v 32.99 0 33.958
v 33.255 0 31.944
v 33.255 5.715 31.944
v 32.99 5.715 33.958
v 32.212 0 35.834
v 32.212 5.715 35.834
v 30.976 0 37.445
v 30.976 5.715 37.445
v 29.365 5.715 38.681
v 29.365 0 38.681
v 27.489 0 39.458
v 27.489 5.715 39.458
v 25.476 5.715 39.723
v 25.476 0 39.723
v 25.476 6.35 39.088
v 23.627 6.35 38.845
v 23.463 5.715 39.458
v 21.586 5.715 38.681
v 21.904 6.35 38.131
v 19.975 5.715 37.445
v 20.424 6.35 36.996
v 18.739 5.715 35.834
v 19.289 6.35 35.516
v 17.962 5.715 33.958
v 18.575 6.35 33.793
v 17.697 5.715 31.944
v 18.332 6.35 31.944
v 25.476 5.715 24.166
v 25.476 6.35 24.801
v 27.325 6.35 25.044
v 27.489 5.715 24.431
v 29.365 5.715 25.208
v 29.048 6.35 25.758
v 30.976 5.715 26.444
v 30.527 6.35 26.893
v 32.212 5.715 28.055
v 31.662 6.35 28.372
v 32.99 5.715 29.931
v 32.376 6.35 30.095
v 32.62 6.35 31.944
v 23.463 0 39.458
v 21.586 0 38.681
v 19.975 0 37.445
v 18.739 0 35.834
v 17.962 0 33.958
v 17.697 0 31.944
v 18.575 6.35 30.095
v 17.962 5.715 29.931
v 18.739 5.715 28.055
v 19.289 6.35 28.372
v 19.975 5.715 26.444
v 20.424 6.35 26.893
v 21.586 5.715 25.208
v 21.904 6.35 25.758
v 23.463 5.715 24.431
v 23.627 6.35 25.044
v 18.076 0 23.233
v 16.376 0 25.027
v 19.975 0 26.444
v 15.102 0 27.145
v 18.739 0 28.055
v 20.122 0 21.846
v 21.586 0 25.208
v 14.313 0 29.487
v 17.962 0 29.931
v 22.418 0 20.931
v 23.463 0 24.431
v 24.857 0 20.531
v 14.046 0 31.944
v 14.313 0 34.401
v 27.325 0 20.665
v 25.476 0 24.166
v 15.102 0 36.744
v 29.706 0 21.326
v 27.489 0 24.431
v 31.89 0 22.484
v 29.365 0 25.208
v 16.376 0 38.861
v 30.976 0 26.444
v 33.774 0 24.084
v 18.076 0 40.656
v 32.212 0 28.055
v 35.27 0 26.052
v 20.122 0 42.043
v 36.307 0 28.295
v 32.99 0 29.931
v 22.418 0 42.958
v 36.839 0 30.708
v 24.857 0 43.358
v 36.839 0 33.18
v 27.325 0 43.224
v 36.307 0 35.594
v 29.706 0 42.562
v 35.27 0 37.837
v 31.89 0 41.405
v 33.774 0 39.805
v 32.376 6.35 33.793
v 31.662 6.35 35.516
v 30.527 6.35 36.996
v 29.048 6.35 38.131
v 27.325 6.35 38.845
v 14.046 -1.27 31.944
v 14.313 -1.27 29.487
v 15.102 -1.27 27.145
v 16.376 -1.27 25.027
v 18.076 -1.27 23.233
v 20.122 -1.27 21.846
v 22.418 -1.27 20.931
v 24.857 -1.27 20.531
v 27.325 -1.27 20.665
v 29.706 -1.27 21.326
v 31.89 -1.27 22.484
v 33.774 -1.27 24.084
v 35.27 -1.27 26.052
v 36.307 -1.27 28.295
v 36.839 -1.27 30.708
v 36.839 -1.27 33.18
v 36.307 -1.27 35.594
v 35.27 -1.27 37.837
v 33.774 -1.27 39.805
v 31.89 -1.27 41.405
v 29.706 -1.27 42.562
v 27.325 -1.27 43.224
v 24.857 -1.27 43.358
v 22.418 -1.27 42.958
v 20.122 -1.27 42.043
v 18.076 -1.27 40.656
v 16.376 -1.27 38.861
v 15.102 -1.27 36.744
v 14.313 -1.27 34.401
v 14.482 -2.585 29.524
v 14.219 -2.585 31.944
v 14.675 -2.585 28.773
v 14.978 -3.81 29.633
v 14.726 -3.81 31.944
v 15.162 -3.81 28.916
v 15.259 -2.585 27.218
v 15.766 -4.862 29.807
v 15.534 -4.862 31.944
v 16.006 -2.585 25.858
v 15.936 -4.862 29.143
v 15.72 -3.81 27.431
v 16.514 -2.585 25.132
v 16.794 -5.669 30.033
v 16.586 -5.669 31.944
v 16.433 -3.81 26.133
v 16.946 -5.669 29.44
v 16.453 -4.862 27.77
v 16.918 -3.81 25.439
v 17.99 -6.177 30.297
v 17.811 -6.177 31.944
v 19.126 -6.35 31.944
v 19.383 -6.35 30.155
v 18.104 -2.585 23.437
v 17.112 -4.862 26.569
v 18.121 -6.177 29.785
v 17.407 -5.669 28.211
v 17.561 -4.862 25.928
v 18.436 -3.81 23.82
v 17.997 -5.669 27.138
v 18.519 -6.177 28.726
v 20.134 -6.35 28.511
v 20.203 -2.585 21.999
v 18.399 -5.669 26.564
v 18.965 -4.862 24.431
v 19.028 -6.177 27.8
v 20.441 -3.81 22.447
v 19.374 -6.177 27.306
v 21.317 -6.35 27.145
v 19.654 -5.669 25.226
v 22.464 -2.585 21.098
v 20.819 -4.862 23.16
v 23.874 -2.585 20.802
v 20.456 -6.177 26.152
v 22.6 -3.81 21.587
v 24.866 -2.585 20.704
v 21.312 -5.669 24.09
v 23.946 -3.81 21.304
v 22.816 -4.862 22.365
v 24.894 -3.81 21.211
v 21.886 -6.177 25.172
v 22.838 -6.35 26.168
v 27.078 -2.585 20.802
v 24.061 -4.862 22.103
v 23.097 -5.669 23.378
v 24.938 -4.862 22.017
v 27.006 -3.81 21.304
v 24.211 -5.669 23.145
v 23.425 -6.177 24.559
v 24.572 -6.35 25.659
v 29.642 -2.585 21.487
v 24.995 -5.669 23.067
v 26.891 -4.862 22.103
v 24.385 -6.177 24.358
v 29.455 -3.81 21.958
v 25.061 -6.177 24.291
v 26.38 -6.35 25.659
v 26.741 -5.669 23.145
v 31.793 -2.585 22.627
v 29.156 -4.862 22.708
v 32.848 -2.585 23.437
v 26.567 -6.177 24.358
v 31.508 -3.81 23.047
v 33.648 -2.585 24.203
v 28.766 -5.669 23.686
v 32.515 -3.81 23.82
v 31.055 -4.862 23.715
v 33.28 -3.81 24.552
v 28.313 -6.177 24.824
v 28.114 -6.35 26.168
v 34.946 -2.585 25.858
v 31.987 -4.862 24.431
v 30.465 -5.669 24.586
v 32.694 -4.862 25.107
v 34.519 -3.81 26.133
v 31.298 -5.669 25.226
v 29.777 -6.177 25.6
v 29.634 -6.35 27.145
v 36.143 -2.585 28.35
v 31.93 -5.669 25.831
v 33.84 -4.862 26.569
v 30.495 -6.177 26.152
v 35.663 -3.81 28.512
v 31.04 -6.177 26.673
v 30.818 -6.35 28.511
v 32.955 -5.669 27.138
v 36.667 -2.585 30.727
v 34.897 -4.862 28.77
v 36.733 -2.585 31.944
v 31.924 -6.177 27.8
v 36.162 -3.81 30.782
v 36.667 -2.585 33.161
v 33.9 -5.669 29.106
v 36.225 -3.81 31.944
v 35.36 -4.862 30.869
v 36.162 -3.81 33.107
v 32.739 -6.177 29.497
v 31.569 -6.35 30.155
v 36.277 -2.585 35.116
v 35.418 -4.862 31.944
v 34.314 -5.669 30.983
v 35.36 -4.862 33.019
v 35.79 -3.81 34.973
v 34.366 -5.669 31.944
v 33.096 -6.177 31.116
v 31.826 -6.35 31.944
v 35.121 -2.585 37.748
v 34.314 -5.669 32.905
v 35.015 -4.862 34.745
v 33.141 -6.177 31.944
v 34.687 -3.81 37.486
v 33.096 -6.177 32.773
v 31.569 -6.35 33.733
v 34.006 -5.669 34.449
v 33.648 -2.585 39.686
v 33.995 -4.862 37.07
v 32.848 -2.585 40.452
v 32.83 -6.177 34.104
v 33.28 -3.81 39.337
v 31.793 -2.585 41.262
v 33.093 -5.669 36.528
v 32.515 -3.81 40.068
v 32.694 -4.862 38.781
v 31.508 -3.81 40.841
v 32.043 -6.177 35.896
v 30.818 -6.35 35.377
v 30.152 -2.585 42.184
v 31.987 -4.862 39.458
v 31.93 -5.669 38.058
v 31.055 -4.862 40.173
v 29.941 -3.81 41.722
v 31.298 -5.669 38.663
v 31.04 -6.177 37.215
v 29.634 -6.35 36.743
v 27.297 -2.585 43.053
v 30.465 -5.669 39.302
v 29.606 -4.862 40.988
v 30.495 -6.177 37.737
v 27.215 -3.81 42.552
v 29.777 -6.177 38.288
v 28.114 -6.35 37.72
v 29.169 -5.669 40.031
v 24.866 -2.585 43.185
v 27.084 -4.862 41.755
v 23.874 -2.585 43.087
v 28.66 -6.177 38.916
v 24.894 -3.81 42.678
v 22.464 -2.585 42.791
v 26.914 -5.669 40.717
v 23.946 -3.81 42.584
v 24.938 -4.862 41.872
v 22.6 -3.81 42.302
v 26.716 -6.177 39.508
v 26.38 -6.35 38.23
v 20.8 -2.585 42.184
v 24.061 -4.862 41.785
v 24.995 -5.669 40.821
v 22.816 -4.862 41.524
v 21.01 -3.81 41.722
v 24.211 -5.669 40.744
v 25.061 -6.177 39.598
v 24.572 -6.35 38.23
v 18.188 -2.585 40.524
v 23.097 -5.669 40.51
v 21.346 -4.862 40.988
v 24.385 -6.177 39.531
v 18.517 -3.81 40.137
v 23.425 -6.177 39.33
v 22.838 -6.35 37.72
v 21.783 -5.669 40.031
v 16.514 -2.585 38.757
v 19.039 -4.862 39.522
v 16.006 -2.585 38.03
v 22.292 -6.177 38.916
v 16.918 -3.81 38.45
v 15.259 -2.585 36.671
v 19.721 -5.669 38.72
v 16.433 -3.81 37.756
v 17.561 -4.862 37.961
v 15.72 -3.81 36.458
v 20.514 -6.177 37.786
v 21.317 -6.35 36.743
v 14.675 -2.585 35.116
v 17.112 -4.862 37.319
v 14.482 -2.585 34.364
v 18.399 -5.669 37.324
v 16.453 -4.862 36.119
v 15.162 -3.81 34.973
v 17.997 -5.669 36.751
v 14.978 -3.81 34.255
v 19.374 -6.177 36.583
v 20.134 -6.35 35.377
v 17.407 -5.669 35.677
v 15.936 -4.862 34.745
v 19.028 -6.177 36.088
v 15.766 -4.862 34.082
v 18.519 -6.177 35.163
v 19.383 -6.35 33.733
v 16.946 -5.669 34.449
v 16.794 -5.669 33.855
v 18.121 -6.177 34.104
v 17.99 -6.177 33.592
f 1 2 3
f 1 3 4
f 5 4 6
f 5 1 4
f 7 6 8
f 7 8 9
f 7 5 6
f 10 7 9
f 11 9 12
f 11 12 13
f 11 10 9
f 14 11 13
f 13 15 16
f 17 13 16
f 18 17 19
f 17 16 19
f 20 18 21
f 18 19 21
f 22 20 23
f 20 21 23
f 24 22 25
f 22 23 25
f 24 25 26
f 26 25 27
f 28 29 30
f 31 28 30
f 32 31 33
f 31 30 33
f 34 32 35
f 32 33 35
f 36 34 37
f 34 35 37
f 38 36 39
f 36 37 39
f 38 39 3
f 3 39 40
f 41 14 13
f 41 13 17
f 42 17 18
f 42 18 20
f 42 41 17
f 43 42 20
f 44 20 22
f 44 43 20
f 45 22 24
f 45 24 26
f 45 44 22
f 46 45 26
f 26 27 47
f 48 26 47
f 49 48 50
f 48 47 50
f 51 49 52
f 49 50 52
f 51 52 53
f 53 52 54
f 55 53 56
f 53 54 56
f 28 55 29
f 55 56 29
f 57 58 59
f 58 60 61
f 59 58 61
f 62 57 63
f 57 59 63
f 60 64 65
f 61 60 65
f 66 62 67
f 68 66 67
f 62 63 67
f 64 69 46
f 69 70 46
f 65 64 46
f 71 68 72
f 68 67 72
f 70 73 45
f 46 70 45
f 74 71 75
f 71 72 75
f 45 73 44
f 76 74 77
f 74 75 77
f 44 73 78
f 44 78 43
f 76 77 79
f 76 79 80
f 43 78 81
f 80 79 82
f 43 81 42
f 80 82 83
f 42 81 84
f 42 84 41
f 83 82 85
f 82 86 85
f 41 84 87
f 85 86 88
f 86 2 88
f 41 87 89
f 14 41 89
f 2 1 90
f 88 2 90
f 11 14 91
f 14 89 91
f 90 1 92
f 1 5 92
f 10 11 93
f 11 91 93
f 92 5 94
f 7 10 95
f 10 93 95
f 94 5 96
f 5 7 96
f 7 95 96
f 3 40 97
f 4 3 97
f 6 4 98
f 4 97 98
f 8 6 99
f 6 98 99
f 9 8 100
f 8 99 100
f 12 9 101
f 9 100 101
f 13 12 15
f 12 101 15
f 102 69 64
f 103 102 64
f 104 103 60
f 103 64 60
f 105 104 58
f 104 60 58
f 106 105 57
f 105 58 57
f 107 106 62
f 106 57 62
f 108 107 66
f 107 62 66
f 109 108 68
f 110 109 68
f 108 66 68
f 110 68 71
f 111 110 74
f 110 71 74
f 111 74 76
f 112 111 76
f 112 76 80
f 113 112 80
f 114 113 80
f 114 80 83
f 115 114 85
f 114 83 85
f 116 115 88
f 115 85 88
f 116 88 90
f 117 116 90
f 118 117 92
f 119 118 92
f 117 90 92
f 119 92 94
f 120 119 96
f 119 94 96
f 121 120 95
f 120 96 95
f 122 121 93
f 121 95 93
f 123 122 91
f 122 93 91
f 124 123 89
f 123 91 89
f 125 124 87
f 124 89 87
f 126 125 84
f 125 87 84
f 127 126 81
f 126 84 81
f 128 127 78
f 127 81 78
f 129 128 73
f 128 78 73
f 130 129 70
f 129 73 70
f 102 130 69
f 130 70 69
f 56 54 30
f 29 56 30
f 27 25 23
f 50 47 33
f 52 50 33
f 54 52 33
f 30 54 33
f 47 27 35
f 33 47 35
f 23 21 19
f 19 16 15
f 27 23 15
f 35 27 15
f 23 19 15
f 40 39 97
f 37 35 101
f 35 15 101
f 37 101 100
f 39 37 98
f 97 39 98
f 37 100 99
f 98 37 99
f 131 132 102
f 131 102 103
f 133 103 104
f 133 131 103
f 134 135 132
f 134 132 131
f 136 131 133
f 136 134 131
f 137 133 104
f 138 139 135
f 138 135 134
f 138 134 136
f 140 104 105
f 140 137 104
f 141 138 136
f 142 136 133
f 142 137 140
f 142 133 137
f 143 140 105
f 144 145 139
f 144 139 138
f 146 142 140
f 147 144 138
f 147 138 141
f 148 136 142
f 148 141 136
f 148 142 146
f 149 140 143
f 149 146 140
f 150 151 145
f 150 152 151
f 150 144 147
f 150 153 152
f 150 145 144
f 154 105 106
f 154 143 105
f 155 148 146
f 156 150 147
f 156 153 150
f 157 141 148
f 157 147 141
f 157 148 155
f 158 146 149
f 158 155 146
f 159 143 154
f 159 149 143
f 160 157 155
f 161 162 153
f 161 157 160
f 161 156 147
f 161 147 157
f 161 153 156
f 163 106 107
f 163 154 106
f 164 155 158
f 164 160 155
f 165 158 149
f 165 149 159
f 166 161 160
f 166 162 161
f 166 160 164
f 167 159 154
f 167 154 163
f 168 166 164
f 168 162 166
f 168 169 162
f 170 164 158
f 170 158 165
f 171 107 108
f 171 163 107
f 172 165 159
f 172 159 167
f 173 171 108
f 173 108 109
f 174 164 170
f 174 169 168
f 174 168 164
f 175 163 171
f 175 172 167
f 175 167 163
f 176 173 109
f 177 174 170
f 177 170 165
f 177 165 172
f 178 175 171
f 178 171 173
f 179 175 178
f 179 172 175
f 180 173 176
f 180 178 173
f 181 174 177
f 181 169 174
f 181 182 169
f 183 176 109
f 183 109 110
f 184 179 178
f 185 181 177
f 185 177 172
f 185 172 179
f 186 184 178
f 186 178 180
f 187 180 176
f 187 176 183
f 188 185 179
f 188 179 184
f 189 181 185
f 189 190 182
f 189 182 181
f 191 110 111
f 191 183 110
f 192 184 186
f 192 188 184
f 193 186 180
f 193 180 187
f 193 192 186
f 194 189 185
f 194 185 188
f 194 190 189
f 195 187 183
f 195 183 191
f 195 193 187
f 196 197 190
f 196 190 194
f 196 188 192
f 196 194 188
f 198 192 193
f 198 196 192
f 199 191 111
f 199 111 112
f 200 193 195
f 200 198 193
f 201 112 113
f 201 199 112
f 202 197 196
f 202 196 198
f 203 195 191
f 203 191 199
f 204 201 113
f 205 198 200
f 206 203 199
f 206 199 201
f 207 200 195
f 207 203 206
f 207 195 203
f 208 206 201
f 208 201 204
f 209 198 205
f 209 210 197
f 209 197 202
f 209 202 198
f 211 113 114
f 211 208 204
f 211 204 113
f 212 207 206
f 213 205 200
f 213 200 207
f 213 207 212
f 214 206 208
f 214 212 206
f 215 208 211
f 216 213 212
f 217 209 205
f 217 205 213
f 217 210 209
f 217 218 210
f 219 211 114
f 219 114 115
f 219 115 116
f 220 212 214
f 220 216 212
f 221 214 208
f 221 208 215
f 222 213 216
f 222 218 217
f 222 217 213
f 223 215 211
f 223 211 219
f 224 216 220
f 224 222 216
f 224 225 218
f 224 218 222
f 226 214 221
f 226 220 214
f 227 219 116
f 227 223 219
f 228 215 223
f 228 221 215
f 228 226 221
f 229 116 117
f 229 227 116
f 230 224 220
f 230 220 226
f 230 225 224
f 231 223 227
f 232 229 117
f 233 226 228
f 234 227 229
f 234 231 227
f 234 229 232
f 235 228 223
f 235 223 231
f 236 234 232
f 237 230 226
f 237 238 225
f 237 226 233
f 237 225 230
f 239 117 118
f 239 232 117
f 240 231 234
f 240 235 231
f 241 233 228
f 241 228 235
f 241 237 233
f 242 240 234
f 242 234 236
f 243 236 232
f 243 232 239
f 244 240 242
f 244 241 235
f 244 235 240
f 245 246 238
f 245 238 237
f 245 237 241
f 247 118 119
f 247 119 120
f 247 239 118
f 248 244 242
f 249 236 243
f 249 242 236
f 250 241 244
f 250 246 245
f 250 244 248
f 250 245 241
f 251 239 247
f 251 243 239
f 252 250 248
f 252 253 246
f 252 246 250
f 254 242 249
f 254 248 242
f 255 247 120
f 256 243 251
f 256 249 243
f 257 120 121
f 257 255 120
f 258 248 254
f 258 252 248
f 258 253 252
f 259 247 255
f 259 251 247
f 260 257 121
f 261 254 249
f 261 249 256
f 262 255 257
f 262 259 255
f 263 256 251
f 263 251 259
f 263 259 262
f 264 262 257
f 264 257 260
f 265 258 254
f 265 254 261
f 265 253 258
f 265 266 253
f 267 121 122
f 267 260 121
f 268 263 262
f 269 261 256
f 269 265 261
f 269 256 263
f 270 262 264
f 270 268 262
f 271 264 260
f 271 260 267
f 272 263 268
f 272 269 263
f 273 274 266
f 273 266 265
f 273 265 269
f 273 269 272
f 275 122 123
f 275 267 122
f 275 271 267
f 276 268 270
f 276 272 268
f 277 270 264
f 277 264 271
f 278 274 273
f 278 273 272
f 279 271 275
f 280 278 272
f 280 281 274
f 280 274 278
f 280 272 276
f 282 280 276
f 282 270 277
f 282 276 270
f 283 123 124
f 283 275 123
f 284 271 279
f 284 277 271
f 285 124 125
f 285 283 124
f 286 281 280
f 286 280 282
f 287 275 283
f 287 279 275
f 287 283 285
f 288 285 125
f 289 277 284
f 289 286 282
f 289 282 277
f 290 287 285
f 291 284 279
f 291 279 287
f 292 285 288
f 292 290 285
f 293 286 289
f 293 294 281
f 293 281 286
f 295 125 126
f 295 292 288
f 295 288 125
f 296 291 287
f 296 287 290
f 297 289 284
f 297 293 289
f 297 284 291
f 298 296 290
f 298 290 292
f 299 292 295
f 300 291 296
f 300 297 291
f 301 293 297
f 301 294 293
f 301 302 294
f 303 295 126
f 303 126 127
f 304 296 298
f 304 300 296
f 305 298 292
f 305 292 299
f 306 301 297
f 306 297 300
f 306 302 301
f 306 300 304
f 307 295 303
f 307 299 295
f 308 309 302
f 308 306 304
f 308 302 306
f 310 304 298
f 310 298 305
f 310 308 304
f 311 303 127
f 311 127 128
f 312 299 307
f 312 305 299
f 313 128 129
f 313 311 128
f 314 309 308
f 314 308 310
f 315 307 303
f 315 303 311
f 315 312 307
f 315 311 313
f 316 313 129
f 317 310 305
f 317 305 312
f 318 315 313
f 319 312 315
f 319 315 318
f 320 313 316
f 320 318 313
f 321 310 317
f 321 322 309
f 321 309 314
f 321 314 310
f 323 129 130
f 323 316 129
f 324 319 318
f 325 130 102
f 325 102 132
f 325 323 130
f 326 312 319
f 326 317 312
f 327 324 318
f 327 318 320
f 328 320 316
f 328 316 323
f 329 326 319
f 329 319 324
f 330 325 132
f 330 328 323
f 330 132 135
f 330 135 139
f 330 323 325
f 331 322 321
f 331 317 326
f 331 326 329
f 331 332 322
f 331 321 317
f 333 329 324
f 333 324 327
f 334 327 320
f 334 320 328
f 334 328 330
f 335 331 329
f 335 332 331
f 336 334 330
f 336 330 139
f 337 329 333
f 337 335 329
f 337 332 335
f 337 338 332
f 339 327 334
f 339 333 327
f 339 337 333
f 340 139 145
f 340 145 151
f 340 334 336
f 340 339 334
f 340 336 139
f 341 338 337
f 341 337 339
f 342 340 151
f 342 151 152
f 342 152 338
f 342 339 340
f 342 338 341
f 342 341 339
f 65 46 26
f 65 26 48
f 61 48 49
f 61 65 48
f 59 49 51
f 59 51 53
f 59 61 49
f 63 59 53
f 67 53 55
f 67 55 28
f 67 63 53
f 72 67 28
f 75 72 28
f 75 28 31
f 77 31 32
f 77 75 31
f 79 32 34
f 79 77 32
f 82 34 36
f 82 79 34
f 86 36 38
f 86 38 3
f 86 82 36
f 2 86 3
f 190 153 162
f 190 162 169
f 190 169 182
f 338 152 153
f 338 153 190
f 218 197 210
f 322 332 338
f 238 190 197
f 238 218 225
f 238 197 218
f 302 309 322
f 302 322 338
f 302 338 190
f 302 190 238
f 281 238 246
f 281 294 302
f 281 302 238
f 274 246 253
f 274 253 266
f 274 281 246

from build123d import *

# Parameters (mm, degrees)
F1_DEPTH  = 6.35
F2_SIZE   = 0.635
F1_FACE_R = 7.77875
F3_DEPTH  = 6.35
F4_R      = 5.08


with BuildPart() as f1:
    # F0 (on Front) → F1 (new body)
    with BuildSketch(Plane.XZ):
        with BuildLine():
            Line((25.4758205265, 31.9442898035), (25.4758205265, 39.7230398035))
            ThreePointArc((25.4758205265, 39.7230398035), (19.9754136523, 37.4446966777), (17.6970705265, 31.9442898035))
            Line((17.6970705265, 31.9442898035), (25.4758205265, 31.9442898035))
        make_face()
        with BuildLine():
            Line((25.4758205265, 31.9442898035), (33.2545705265, 31.9442898035))
            ThreePointArc((33.2545705265, 31.9442898035), (30.9762274006, 37.4446966777), (25.4758205265, 39.7230398035))
            Line((25.4758205265, 39.7230398035), (25.4758205265, 31.9442898035))
        make_face()
        with BuildLine():
            ThreePointArc((25.4758205265, 24.1655398035), (30.9762274006, 26.4438829294), (33.2545705265, 31.9442898035))
            Line((33.2545705265, 31.9442898035), (25.4758205265, 31.9442898035))
            Line((25.4758205265, 31.9442898035), (25.4758205265, 24.1655398035))
        make_face()
        with BuildLine():
            ThreePointArc((17.6970705265, 31.9442898035), (19.9754136523, 26.4438829294), (25.4758205265, 24.1655398035))
            Line((25.4758205265, 24.1655398035), (25.4758205265, 31.9442898035))
            Line((25.4758205265, 31.9442898035), (17.6970705265, 31.9442898035))
        make_face()
    extrude(amount=-F1_DEPTH)

    # F2
    f2_edges = [f1.edges().sort_by_distance(p)[0] for p in [
        (33.254571, 6.35, 31.94429),
    ]]
    chamfer(f2_edges, length=F2_SIZE)

    # F0 (on Front) + F1_face (on face) → F3 (join)
    with BuildSketch(Plane.XZ):
        with BuildLine():
            ThreePointArc((25.4758205265, 39.7230398035), (30.9762274006, 37.4446966777), (33.2545705265, 31.9442898035))
            Line((33.2545705265, 31.9442898035), (36.9058205265, 31.9442898035))
            ThreePointArc((36.9058205265, 31.9442898035), (25.4758205265, 43.3742898035), (14.0458205265, 31.9442898035))
            Line((14.0458205265, 31.9442898035), (17.6970705265, 31.9442898035))
            ThreePointArc((17.6970705265, 31.9442898035), (19.9754136523, 37.4446966777), (25.4758205265, 39.7230398035))
        make_face()
        with BuildLine():
            Line((36.9058205265, 31.9442898035), (33.2545705265, 31.9442898035))
            ThreePointArc((33.2545705265, 31.9442898035), (30.9762274006, 26.4438829294), (25.4758205265, 24.1655398035))
            ThreePointArc((25.4758205265, 24.1655398035), (19.9754136523, 26.4438829294), (17.6970705265, 31.9442898035))
            Line((17.6970705265, 31.9442898035), (14.0458205265, 31.9442898035))
            ThreePointArc((14.0458205265, 31.9442898035), (25.4758205265, 20.5142898035), (36.9058205265, 31.9442898035))
        make_face()
    with BuildSketch(Plane(origin=(25.4758205265, 0, 31.9442898035), x_dir=(1, 0, 0), z_dir=(0, -1, 0))):
        Circle(F1_FACE_R)
    extrude(amount=F3_DEPTH)

    # F4
    f4_edges = [f1.edges().sort_by_distance(p)[0] for p in [
        (36.905821, -6.35, 31.94429),
    ]]
    fillet(f4_edges, radius=F4_R)


solid = f1.part
